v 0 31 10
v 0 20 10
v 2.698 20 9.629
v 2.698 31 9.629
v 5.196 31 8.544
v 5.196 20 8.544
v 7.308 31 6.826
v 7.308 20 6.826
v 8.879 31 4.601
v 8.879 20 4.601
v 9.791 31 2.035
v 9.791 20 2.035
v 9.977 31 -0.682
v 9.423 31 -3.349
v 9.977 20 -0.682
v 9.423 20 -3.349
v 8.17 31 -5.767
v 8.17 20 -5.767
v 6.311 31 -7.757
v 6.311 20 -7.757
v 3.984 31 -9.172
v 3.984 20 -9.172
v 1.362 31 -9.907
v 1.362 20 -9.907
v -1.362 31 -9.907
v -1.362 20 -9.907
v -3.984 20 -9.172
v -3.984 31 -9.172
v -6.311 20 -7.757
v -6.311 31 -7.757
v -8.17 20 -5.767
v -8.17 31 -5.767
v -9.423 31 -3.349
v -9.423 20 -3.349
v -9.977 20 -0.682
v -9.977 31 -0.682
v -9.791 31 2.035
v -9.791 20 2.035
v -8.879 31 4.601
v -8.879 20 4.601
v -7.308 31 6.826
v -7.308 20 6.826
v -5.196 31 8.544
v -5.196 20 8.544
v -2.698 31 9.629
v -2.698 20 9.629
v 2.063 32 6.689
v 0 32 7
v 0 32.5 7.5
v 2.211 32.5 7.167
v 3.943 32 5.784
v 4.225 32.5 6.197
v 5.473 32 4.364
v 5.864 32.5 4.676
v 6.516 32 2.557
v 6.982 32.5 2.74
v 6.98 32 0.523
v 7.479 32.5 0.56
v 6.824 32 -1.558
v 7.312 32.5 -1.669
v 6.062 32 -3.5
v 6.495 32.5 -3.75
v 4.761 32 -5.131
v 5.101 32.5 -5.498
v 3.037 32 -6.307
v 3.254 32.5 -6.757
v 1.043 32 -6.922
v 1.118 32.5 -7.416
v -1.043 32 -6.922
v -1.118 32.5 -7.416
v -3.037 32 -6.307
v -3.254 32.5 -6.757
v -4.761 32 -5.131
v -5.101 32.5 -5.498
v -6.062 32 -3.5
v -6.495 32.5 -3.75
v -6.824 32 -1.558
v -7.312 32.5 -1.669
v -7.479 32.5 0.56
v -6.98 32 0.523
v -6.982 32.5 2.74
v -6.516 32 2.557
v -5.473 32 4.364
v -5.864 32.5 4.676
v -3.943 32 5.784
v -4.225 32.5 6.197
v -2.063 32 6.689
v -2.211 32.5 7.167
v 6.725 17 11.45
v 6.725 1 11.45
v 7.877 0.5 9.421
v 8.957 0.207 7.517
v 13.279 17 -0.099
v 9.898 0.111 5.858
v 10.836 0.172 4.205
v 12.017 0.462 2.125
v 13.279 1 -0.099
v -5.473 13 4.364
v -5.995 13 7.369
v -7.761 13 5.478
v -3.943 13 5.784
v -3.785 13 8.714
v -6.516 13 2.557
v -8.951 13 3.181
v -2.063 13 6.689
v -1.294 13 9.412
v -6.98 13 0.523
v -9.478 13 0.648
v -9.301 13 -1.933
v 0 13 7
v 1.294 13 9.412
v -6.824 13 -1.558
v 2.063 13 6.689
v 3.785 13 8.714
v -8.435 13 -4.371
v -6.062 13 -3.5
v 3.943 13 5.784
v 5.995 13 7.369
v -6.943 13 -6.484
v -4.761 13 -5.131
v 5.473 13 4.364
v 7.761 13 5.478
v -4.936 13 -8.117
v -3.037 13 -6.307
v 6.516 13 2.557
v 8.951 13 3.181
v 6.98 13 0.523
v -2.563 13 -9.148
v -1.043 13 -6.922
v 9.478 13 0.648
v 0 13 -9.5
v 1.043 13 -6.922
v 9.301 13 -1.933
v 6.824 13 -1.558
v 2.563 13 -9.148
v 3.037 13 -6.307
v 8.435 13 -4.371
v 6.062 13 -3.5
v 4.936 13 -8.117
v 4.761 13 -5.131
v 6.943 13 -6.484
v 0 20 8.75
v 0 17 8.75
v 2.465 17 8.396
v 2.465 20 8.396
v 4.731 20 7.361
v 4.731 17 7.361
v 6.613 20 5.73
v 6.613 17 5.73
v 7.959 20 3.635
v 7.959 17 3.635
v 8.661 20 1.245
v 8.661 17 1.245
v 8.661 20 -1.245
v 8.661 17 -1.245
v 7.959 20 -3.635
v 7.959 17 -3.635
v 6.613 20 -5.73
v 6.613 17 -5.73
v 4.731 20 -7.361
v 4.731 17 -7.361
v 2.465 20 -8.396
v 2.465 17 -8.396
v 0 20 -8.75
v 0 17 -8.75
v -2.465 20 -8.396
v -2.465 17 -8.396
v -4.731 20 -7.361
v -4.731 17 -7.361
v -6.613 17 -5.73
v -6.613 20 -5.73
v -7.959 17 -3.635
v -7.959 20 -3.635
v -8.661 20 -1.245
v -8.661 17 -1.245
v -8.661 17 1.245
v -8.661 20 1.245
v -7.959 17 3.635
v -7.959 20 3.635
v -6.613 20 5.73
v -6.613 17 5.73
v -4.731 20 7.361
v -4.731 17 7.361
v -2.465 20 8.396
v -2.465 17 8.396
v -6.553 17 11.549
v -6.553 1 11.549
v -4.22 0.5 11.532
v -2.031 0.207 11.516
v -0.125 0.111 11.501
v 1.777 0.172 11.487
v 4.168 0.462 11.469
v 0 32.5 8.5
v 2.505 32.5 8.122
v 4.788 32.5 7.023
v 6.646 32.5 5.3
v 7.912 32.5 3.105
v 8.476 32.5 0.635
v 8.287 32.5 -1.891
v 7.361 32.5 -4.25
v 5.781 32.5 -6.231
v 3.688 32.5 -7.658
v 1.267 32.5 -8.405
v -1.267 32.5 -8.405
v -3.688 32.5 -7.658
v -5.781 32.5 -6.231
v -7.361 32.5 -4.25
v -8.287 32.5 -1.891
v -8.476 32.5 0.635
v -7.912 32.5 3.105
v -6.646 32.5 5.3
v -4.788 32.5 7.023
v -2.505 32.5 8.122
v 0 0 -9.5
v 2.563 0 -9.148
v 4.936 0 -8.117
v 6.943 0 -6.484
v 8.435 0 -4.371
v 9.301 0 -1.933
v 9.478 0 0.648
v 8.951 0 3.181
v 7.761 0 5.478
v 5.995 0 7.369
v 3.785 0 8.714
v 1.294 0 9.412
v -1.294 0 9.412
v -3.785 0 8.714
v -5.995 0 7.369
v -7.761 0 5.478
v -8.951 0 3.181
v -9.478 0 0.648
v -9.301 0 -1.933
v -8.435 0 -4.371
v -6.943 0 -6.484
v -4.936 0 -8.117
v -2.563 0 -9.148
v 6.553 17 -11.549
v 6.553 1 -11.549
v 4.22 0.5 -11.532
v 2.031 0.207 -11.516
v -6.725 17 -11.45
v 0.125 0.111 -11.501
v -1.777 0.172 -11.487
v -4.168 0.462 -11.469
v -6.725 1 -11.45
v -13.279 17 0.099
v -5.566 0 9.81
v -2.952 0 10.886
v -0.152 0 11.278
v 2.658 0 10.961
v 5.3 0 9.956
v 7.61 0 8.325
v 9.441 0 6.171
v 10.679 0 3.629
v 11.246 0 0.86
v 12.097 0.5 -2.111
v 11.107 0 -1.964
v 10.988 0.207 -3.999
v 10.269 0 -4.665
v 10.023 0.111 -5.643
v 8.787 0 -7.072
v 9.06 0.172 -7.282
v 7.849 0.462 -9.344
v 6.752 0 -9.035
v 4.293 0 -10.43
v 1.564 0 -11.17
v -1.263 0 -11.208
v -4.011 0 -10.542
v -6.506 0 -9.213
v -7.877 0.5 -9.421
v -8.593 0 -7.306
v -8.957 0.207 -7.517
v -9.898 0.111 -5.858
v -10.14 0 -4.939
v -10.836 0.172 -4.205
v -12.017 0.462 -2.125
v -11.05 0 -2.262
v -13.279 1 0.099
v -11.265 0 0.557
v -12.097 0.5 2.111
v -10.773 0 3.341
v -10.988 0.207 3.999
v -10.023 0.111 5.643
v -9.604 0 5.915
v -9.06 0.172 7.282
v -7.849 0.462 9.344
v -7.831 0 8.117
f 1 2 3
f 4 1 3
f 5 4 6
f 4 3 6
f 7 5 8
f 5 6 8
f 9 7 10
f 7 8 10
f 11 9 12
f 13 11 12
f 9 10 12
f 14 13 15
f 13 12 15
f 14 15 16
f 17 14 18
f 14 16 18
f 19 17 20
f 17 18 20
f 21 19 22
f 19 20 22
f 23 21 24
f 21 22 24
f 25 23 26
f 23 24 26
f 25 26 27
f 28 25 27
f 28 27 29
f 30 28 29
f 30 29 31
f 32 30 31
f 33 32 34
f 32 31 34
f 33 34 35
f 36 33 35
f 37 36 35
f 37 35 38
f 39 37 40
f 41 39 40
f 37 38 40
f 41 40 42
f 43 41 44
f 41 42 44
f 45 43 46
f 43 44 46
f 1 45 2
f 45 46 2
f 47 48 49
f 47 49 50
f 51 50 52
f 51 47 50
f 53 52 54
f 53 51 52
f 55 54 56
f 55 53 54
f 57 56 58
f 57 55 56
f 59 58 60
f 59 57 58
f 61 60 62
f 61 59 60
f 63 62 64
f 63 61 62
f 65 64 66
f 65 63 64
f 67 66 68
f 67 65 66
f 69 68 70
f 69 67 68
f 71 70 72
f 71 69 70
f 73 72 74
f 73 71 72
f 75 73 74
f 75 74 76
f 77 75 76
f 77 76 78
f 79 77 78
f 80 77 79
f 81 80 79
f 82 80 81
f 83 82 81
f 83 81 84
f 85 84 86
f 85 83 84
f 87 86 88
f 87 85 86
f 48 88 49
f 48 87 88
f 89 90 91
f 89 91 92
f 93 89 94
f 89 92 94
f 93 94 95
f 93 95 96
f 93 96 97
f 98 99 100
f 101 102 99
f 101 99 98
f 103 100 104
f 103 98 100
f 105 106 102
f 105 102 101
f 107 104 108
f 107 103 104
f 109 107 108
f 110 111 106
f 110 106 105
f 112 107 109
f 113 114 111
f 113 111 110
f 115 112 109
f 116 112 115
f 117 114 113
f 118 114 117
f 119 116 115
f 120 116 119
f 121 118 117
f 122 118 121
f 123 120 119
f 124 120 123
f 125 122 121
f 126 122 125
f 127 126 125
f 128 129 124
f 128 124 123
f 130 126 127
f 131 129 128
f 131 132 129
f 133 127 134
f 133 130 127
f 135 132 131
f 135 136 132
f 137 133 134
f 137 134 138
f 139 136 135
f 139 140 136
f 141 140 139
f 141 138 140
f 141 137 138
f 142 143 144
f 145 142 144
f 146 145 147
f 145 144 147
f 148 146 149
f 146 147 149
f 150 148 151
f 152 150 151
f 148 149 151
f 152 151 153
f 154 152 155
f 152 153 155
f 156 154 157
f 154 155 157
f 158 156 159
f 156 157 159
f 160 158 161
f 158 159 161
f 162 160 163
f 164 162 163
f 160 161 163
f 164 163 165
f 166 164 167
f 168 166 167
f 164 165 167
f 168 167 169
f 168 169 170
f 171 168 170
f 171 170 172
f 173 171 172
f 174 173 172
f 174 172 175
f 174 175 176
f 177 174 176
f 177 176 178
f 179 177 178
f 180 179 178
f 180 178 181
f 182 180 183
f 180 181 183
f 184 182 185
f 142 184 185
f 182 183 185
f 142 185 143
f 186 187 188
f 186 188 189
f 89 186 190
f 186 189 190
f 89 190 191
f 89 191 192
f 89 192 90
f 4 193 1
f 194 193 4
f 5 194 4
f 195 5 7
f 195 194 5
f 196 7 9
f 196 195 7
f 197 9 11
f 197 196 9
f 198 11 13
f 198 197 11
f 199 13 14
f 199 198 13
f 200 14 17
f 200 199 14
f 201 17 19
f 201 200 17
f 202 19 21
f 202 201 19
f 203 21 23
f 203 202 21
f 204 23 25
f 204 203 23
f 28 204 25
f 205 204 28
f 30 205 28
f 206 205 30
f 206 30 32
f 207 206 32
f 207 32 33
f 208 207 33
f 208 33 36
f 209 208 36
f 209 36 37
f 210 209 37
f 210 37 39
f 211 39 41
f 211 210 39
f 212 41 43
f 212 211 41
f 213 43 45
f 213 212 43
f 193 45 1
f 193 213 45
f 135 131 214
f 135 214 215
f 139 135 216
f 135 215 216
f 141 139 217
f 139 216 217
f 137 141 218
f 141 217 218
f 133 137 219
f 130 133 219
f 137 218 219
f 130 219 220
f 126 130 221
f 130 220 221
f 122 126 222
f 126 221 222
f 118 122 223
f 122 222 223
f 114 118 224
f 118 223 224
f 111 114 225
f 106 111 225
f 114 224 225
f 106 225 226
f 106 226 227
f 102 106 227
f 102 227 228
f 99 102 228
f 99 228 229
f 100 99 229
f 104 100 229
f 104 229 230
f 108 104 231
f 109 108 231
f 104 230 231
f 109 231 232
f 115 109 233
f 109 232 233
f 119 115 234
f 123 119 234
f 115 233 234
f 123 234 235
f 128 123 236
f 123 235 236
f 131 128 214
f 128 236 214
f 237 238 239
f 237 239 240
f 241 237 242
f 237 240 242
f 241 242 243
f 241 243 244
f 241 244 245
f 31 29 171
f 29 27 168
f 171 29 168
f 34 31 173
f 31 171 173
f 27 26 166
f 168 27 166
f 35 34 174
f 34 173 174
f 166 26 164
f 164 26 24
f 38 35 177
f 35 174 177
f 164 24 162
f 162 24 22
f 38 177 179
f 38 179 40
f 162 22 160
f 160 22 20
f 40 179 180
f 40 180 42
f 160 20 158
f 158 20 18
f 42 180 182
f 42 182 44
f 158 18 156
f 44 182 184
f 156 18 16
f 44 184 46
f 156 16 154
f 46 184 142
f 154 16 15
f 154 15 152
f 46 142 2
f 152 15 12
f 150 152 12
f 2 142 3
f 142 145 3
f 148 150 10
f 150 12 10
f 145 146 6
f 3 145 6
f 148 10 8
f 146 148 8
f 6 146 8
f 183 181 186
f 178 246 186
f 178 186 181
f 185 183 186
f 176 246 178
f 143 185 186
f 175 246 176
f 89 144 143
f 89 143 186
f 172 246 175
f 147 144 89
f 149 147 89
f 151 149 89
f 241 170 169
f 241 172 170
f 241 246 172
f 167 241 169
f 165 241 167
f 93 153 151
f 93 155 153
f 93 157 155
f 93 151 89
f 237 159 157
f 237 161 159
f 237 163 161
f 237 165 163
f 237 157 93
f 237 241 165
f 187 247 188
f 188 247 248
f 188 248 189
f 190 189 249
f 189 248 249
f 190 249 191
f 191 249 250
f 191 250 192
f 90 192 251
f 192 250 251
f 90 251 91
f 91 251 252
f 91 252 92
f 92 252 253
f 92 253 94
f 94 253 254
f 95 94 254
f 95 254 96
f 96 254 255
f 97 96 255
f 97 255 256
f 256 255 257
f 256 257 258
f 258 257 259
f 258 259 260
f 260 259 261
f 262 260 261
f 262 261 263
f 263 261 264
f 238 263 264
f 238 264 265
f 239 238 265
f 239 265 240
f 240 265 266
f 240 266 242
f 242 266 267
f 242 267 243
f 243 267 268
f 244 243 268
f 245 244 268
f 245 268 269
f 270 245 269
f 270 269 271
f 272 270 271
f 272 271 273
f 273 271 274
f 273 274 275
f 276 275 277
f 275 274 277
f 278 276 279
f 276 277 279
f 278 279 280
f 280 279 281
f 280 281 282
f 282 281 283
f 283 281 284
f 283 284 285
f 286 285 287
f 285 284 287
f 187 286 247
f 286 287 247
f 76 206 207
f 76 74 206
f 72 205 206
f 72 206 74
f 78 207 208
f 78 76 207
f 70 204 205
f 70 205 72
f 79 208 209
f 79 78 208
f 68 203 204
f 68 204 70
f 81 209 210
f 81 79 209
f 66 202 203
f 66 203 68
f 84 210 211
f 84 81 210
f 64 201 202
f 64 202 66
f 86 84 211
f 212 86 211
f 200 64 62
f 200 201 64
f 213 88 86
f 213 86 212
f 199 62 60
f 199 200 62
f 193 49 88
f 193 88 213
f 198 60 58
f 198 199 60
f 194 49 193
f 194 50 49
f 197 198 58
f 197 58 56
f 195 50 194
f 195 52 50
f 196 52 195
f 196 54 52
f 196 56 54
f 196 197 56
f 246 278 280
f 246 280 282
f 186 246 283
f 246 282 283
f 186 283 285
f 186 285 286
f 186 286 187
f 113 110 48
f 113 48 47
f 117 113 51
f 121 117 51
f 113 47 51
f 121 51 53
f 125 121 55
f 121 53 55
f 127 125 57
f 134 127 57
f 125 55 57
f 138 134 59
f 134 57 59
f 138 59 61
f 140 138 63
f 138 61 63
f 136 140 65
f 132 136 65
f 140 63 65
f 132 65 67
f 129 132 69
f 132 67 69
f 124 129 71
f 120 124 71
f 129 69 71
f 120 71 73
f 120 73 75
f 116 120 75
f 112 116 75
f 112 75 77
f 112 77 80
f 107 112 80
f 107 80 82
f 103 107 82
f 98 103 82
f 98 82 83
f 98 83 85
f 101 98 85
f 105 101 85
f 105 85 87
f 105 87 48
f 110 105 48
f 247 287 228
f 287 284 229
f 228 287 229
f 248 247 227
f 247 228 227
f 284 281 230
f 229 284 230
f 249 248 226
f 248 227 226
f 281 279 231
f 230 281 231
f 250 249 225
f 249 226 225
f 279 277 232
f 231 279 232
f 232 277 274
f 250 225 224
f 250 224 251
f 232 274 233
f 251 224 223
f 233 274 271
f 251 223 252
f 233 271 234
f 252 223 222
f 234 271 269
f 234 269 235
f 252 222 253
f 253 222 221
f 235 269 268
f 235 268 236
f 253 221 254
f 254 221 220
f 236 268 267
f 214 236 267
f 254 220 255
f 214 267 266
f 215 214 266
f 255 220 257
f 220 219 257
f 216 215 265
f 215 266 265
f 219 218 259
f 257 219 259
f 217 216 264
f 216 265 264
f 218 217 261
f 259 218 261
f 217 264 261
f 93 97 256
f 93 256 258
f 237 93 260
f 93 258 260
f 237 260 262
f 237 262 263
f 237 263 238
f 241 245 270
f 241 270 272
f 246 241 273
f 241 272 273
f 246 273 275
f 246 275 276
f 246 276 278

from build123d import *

# Parameters (mm, degrees)
EXTRUDE_1_DEPTH     = 17
SKETCH_2_R          = 8.75
EXTRUDE_2_DEPTH     = 3
SKETCH_3_R          = 10
EXTRUDE_3_DEPTH     = 12.5
CHAMFER_1_SIZE      = 1.5
SKETCH_6_R          = 7
CUT_EXTRUDE_1_DEPTH = 37.958912269
CHAMFER_2_SIZE      = 0.5
SKETCH_7_R          = 9.5
CUT_EXTRUDE_2_DEPTH = 13


with BuildPart() as part:
    # 草图1 → 凸台-拉伸1 (new body)
    with BuildSketch(Plane(origin=(0, 0, 0), x_dir=(1, 0, 0), z_dir=(0, 1, 0))):
        Polygon((6.553289027, 11.549360859), (-6.725395388, 11.449995205), (-13.278684415, -0.099365654), (-6.553289027, -11.549360859), (6.725395388, -11.449995205), (13.278684415, 0.099365654), align=None)
    extrude(amount=EXTRUDE_1_DEPTH)

    # 草图2 → 凸台-拉伸2 (add)
    with BuildSketch(Plane(origin=(0, 17, 0), x_dir=(1, 0, 0), z_dir=(0, 1, 0))):
        with Locations(Location((0, 0, 0), (0, 0, 270))):
            Circle(SKETCH_2_R)
    extrude(amount=EXTRUDE_2_DEPTH)

    # 草图3 → 凸台-拉伸3 (add)
    with BuildSketch(Plane(origin=(0, 20, 0), x_dir=(1, 0, 0), z_dir=(0, 1, 0))):
        with Locations(Location((0, 0, 0), (0, 0, 270))):
            Circle(SKETCH_3_R)
    extrude(amount=EXTRUDE_3_DEPTH)

    # 倒角1
    chamfer_1_edges = [part.edges().sort_by_distance(p)[0] for p in [
        (0, 32.5, -10),
    ]]
    chamfer(chamfer_1_edges, length=CHAMFER_1_SIZE)

    # 草图5 → 切除-旋转3 (revolve, cut)
    with BuildSketch(Plane(origin=(0, 0, 0), x_dir=(0.49350563267132574, 0, -0.8697426001534446), z_dir=(0.8697426001534445, 0, 0.4935056326713257)), mode=Mode.PRIVATE) as cut_revolve_3_sk:
        Polygon((13.279056191, 1), (11.279056191, 0), (13.279056191, 0), align=None)
    revolve(cut_revolve_3_sk.sketch.rotate(Axis((0, -1000, 0), (0, 1, 0)), 180.000000003), axis=Axis((0, -1000, 0), (0, 1, 0)), mode=Mode.SUBTRACT)

    # 草图6 → 切除-拉伸1 (cut, through all)
    with BuildSketch(Plane(origin=(0, 32.5, 0), x_dir=(1, 0, 0), z_dir=(0, 1, 0))):
        with Locations(Location((0, 0, 0), (0, 0, 270))):
            Circle(SKETCH_6_R)
    extrude(amount=-CUT_EXTRUDE_1_DEPTH, mode=Mode.SUBTRACT)

    # 倒角2
    chamfer_2_edges = [part.edges().sort_by_distance(p)[0] for p in [
        (0, 0, -7),
        (0, 32.5, -7),
    ]]
    chamfer(chamfer_2_edges, length=CHAMFER_2_SIZE)

    # 草图7 → 切除-拉伸2 (cut)
    with BuildSketch(Plane.XZ):
        with Locations(Location((0, 0, 0), (0, 0, 270))):
            Circle(SKETCH_7_R)
    extrude(amount=-CUT_EXTRUDE_2_DEPTH, mode=Mode.SUBTRACT)


solid = part.part
